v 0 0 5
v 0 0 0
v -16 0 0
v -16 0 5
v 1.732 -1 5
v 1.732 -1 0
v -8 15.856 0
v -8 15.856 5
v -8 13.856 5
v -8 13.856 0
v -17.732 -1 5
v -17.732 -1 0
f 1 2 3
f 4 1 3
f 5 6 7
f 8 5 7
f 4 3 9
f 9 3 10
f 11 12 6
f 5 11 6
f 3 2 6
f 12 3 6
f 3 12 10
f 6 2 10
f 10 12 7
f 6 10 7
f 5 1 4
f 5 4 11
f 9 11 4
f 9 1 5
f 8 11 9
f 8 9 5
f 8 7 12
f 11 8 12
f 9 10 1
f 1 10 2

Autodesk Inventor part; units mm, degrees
ref_plane "YZ Plane" through (0, 0, 0) normal (1, 0, 0) x (0, 1, 0)
ref_plane "XZ Plane" through (0, 0, 0) normal (0, 1, 0) x (-1, 0, 0)
ref_plane "XY Plane" through (0, 0, 0) normal (0, 0, 1) x (1, 0, 0)
sketch "Sketch1" plane through (0, 0, 0) normal (0, 0, 1) x (1, 0, 0)
  line L0 (0, 0) -> (-16, 0)
  line L1 (-16, 0) -> (-8, 13.8564)
  line L2 (-8, 13.8564) -> (0, 0)
  line L3 (0, 0) -> (-16, 0)
  line L4 (-8, 15.8564) -> (-17.7321, -1)
  line L5 (-17.7321, -1) -> (1.7321, -1)
  line L6 (1.7321, -1) -> (-8, 15.8564)
  dimension "d4" = 16
  dimension "d5" = 1
extrude "Extrusion1" add sketch "Sketch1" along normal blind 5
properties part number "dishRing_3DPrint"
